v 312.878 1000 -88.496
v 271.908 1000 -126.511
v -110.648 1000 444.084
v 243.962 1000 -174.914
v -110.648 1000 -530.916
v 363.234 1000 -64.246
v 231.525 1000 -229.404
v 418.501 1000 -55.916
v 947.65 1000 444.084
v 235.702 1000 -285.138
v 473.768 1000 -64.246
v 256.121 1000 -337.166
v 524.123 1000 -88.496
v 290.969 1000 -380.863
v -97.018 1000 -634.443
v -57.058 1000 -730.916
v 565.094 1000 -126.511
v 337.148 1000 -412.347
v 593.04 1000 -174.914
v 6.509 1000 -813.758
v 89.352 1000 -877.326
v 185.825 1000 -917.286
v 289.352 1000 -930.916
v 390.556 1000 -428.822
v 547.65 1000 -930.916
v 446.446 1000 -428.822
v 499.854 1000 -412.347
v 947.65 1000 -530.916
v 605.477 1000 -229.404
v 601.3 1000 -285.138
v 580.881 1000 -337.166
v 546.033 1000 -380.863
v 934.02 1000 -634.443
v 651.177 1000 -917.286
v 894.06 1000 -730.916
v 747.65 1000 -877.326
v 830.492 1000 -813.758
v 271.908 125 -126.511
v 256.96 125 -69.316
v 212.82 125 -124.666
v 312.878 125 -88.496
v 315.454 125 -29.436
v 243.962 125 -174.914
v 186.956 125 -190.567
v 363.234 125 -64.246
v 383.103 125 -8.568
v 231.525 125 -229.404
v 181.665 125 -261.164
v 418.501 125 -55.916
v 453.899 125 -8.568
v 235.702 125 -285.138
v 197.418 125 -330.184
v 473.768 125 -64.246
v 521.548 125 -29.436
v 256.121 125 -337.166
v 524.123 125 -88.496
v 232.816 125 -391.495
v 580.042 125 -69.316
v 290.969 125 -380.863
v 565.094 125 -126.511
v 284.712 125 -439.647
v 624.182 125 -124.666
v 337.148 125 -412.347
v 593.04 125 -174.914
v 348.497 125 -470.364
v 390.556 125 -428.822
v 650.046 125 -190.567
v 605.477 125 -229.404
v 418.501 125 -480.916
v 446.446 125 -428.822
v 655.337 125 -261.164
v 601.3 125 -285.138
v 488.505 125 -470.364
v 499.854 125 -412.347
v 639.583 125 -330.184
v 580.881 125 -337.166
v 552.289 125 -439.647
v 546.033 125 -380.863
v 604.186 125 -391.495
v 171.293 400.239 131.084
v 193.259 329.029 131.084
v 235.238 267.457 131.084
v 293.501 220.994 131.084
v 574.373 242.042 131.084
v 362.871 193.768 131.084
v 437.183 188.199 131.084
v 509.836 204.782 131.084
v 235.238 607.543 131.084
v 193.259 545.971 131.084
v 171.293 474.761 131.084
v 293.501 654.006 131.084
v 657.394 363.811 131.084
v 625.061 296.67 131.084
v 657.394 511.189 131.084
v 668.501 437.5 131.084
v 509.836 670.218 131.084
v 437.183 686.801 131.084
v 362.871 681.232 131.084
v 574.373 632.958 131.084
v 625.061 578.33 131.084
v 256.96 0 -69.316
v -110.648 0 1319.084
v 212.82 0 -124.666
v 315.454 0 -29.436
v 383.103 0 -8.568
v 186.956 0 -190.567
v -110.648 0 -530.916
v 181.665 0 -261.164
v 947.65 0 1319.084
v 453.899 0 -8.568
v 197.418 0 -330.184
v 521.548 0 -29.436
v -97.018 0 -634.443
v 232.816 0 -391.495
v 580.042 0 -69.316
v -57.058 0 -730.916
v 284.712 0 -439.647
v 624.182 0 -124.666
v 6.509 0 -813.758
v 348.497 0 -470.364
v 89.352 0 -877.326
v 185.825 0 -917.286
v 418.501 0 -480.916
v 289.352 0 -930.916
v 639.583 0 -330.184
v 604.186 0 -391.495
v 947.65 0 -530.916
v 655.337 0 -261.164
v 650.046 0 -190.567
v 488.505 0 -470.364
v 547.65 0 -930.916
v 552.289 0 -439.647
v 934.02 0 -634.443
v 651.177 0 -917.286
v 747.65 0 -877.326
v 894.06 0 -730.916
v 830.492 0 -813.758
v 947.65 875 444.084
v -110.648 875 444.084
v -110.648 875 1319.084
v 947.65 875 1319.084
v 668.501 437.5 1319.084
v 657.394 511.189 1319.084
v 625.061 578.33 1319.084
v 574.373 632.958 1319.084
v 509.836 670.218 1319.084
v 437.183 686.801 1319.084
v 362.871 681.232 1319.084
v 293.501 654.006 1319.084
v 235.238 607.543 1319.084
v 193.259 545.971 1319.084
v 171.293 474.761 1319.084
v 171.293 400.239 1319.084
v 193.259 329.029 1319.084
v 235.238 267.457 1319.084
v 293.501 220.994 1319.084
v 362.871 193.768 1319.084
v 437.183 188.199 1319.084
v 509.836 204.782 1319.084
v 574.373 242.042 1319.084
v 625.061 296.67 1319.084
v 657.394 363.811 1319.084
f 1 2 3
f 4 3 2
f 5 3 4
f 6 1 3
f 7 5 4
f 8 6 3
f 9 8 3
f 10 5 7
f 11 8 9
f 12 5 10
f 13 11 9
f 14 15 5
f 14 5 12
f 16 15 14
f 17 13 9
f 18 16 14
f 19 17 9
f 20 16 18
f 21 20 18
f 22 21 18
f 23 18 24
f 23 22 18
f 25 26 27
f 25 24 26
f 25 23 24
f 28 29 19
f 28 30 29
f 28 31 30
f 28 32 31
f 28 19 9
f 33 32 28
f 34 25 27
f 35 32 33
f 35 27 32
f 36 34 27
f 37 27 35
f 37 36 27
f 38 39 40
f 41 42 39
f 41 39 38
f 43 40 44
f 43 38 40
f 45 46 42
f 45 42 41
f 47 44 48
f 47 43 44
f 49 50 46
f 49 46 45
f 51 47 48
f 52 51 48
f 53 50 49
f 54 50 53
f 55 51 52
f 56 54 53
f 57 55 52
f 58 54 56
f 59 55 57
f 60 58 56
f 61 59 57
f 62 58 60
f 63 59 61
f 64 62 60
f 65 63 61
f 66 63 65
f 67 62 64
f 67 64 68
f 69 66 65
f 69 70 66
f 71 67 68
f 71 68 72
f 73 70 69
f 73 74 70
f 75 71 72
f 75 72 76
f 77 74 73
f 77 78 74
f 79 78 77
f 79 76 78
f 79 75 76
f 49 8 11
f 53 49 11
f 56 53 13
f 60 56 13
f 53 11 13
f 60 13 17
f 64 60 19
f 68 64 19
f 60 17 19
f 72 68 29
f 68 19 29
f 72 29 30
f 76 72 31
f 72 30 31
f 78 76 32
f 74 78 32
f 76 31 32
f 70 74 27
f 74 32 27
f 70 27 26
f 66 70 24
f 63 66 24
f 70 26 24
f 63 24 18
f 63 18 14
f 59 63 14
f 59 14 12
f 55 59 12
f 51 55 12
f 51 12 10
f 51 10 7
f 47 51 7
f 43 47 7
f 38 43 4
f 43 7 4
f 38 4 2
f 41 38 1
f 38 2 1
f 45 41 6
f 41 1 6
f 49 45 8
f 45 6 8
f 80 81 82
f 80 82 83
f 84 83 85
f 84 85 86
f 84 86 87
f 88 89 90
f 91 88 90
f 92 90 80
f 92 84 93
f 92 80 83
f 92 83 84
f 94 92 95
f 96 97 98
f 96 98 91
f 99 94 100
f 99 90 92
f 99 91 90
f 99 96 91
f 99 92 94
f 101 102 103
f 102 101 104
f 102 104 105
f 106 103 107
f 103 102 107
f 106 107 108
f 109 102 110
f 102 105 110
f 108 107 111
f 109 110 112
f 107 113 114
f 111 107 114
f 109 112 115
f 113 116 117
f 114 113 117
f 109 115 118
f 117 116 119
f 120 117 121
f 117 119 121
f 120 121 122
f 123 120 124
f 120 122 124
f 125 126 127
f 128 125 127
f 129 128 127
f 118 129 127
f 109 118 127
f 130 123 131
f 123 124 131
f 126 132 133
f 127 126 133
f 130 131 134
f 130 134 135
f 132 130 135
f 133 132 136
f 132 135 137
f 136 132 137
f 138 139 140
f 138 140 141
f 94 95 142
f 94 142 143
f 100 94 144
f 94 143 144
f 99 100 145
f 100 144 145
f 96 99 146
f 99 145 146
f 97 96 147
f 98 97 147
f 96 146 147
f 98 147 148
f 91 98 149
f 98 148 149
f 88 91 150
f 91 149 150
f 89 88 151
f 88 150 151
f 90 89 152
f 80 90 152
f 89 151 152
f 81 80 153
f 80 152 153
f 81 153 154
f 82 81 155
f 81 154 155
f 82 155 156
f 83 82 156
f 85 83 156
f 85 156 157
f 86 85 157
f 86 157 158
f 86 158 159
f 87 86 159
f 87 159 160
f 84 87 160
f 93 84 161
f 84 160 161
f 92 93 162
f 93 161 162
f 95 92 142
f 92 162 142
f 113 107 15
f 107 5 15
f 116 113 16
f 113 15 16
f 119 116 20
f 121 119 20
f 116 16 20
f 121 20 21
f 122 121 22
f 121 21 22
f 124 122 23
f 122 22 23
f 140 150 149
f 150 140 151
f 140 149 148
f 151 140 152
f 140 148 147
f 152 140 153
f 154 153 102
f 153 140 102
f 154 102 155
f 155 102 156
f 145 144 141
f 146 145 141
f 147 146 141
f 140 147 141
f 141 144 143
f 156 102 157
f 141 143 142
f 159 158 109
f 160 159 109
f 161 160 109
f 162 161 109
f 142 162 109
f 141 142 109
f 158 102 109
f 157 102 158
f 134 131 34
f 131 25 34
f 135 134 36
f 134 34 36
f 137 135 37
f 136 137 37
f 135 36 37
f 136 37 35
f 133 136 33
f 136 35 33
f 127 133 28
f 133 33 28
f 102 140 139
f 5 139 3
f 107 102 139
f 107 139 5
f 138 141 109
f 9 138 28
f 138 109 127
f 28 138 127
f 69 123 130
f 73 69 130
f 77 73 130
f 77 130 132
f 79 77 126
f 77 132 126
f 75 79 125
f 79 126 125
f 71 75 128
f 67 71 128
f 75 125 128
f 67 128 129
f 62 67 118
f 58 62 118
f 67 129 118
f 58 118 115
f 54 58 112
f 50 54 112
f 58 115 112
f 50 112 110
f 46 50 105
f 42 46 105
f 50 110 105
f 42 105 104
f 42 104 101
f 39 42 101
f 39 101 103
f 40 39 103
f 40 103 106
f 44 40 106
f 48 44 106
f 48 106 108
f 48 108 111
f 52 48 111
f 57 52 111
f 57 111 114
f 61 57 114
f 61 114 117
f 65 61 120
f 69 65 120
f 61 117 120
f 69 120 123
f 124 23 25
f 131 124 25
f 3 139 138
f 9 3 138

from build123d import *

# Parameters (mm, degrees)
SKETCH1_W           = 1058.297604825
SKETCH1_H           = 1375
BOSS_EXTRUDE4_DEPTH = 1000
SKETCH1_7_W         = 1058.297604825
SKETCH1_7_H         = 875
BOSS_EXTRUDE5_DEPTH = 875
SKETCH5_R           = 250
CUT_EXTRUDE1_DEPTH  = 1188
SKETCH6_R           = 187.5
CUT_EXTRUDE7_DEPTH  = 875
SKETCH7_R           = 237.5
CUT_EXTRUDE8_DEPTH  = 125
FILLET2_R           = 400


with BuildPart() as part:
    # Sketch1 → Boss-Extrude4 (new body)
    with BuildSketch(Plane(origin=(0, 0, 0), x_dir=(1, 0, 0), z_dir=(0, 1, 0))):
        with Locations((418.500975611, 243.415773734)):
            Rectangle(SKETCH1_W, SKETCH1_H)
    extrude(amount=BOSS_EXTRUDE4_DEPTH)

    # Sketch1<7> → Boss-Extrude5 (add)
    with BuildSketch(Plane(origin=(0, 0, 0), x_dir=(1, 0, 0), z_dir=(0, 1, 0))):
        with Locations((418.500975611, -881.584226266)):
            Rectangle(SKETCH1_7_W, SKETCH1_7_H)
    extrude(amount=BOSS_EXTRUDE5_DEPTH)

    # Sketch5 → Cut-Extrude1 (cut)
    with BuildSketch(Plane.XY.offset(1319.084226266)):
        with Locations((418.500975611, 437.5)):
            Circle(SKETCH5_R)
    extrude(amount=-CUT_EXTRUDE1_DEPTH, mode=Mode.SUBTRACT)

    # Sketch6 → Cut-Extrude7 (cut)
    with BuildSketch(Plane(origin=(0, 1000, 0), x_dir=(1, 0, 0), z_dir=(0, 1, 0))):
        with Locations((418.500975611, 243.415773734)):
            Circle(SKETCH6_R)
    extrude(amount=-CUT_EXTRUDE7_DEPTH, mode=Mode.SUBTRACT)

    # Sketch7 → Cut-Extrude8 (cut)
    with BuildSketch(Plane(origin=(0, 0, 0), x_dir=(-1, 0, 0), z_dir=(0, -1, 0))):
        with Locations((-418.500975611, 243.415773734)):
            Circle(SKETCH7_R)
    extrude(amount=-CUT_EXTRUDE8_DEPTH, mode=Mode.SUBTRACT)

    # Fillet2
    fillet2_edges = [part.edges().sort_by_distance(p)[0] for p in [
        (-110.647826802, 500, -930.915773734),
        (947.649778023, 500, -930.915773734),
    ]]
    fillet(fillet2_edges, radius=FILLET2_R)


solid = part.part
